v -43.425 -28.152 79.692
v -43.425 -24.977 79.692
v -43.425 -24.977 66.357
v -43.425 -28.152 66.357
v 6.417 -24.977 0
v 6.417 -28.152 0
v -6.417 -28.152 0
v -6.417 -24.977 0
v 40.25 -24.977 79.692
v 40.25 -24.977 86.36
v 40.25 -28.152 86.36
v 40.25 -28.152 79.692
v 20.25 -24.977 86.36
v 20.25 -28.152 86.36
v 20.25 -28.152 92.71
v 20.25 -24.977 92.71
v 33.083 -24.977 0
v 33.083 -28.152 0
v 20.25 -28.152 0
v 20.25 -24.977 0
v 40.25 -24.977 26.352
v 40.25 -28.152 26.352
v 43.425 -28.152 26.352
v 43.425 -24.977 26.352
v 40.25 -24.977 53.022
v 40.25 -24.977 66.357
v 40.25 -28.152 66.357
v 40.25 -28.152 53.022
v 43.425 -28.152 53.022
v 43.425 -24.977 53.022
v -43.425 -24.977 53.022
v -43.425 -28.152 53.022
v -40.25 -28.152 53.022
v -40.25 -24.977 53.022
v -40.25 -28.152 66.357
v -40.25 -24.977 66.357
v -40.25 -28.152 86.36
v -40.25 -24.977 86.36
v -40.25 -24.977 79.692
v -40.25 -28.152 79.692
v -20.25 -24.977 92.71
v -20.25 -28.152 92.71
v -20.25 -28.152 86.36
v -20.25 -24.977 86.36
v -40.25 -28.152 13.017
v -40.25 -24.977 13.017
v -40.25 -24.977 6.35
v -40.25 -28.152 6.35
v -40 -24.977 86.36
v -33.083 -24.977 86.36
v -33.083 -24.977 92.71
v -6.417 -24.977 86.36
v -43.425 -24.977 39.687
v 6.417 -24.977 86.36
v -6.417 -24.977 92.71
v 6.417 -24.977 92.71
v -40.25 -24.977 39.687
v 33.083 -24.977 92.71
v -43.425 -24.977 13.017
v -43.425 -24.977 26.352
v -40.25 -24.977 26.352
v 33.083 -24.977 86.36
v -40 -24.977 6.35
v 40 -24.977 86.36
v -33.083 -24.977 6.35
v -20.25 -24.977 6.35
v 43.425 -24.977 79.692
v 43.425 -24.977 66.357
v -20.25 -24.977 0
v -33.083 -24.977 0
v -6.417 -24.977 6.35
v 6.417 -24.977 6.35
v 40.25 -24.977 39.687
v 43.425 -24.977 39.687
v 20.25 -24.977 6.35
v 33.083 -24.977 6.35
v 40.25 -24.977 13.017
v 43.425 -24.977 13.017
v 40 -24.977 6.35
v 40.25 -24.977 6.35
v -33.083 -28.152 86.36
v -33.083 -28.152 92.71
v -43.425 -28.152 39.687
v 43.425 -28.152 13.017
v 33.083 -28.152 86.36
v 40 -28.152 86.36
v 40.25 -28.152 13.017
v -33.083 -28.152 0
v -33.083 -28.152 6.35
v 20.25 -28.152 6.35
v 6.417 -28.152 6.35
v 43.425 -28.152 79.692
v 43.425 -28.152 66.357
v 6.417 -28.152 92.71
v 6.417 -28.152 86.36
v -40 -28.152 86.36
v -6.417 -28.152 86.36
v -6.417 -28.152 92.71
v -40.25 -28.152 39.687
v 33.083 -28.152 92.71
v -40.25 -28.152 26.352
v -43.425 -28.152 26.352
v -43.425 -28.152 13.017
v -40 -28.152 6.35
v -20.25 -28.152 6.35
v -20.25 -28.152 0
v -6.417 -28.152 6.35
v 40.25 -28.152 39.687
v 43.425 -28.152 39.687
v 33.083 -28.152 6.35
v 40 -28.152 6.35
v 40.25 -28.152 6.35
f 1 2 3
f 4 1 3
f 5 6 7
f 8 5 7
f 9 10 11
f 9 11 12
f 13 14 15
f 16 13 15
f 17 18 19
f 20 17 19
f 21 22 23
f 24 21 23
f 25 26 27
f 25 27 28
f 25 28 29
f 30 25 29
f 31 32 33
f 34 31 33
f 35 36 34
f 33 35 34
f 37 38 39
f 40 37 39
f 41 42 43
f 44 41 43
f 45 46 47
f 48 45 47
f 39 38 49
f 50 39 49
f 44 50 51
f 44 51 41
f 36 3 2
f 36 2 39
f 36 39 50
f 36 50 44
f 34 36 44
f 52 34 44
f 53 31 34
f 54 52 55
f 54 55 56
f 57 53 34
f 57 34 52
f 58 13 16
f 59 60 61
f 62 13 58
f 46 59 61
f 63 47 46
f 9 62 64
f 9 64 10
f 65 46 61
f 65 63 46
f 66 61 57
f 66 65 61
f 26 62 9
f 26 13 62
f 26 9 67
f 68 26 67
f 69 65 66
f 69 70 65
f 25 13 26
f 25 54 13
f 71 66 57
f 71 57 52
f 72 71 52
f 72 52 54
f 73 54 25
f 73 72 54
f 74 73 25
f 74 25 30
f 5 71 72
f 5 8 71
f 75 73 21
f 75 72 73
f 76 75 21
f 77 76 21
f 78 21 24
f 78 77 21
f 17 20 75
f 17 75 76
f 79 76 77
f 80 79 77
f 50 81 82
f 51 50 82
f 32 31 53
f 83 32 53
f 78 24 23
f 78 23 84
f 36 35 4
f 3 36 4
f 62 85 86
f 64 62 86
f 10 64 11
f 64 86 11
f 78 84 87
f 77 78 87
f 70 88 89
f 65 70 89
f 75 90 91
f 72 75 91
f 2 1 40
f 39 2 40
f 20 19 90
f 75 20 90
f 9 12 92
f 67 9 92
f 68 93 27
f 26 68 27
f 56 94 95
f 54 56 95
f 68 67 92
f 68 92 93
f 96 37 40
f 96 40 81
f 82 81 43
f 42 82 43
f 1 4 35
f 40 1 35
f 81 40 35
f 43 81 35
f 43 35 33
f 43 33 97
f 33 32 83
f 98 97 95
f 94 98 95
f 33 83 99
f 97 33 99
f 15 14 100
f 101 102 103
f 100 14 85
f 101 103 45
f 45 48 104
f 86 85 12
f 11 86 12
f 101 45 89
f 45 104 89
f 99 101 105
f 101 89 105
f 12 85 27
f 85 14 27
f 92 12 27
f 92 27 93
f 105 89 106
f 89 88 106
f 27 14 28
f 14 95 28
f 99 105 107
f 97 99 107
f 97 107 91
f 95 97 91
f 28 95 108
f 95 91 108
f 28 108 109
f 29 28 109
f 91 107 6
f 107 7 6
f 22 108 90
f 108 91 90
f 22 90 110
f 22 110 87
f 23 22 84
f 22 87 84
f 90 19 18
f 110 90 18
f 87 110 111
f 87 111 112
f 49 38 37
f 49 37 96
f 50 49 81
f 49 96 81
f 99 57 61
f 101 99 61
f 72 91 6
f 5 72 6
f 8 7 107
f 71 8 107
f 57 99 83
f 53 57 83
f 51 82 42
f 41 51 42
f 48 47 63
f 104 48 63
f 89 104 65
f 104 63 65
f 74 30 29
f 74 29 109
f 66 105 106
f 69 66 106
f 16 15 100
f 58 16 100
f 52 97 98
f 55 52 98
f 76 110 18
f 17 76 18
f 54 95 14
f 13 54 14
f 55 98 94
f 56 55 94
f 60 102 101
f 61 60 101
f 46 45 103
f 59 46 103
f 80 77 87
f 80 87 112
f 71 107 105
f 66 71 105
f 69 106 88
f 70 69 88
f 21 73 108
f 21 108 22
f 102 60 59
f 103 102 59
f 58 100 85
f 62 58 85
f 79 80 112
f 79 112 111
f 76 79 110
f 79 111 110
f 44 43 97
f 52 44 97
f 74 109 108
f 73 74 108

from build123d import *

# Parameters (mm, degrees)
BOSS_EXTRUDE1_DEPTH      = 1.5875
BOSS_EXTRUDE1_DEPTH_BACK = 1.5875
SKETCH3_W                = 0.25
SKETCH3_H                = 13.334960838
SKETCH3_H_2              = 13.334960839
CUT_EXTRUDE1_DEPTH       = 103.531394128
SKETCH4_W                = 0.25
SKETCH4_H                = 6.667480419
SKETCH4_H_2              = 13.334960838
BOSS_EXTRUDE2_DEPTH      = 3.175


with BuildPart() as part:
    # Sketch2 → Boss-Extrude1 (new, two sides: drawn at the far end of the back side and taken through both)
    with BuildSketch(Plane(origin=(0, -26.564964534, 0), x_dir=(1, 0, 0), z_dir=(0, 1, 0)).offset(-BOSS_EXTRUDE1_DEPTH_BACK)):
        Polygon((-40, -26.352441257), (-40, -39.687402095), (-43.675, -39.687402095), (-43.675, -53.022362934), (-40, -53.022362934), (-40, -66.357323772), (-43.675, -66.357323772), (-43.675, -79.69228461), (-40, -79.69228461), (-40, -86.359765029), (-33.083333333, -86.359765029), (-33.083333333, -92.709765029), (-20.25, -92.709765029), (-20.25, -86.359765029), (-6.416666667, -86.359765029), (-6.416666667, -92.709765029), (6.416666667, -92.709765029), (6.416666667, -86.359765029), (20.25, -86.359765029), (20.25, -92.709765029), (33.083333333, -92.709765029), (33.083333333, -86.359765029), (40, -86.359765029), (40, -79.69228461), (43.675, -79.69228461), (43.675, -66.357323772), (40, -66.357323772), (40, -53.022362934), (43.675, -53.022362934), (43.675, -39.687402095), (40, -39.687402095), (40, -26.352441257), (43.675, -26.352441257), (43.675, -13.017480419), (40, -13.017480419), (40, -6.35), (33.083333333, -6.35), (33.083333333, 0), (20.25, 0), (20.25, -6.35), (6.416666667, -6.35), (6.416666667, 0), (-6.416666667, 0), (-6.416666667, -6.35), (-20.25, -6.35), (-20.25, 0), (-33.083333333, 0), (-33.083333333, -6.35), (-40, -6.35), (-40, -13.017480419), (-43.675, -13.017480419), (-43.675, -26.352441257), align=None)
    extrude(amount=BOSS_EXTRUDE1_DEPTH + BOSS_EXTRUDE1_DEPTH_BACK)

    # Sketch3 → Cut-Extrude1 (cut, through all)
    with BuildSketch(Plane(origin=(0, -24.977464534, 0), x_dir=(1, 0, 0), z_dir=(0, 1, 0))):
        with Locations((-43.55, -19.684960838)):
            Rectangle(SKETCH3_W, SKETCH3_H)
        with Locations((-43.55, -46.354882515)):
            Rectangle(SKETCH3_W, SKETCH3_H_2)
        with Locations((-43.55, -73.024804191)):
            Rectangle(SKETCH3_W, SKETCH3_H)
        with Locations((43.55, -19.684960838)):
            Rectangle(SKETCH3_W, SKETCH3_H)
        with Locations((43.55, -46.354882515)):
            Rectangle(SKETCH3_W, SKETCH3_H_2)
        with Locations((43.55, -73.024804191)):
            Rectangle(SKETCH3_W, SKETCH3_H)
    extrude(amount=-CUT_EXTRUDE1_DEPTH, mode=Mode.SUBTRACT)

    # Sketch4 → Boss-Extrude2 (add)
    with BuildSketch(Plane(origin=(0, -24.977464534, 0), x_dir=(1, 0, 0), z_dir=(0, 1, 0))):
        with Locations((-40.125, -9.683740209)):
            Rectangle(SKETCH4_W, SKETCH4_H)
        with Locations((-40.125, -33.019921676)):
            Rectangle(SKETCH4_W, SKETCH4_H_2)
        with Locations((-40.125, -59.689843353)):
            Rectangle(SKETCH4_W, SKETCH4_H_2)
        with Locations((-40.125, -83.02602482)):
            Rectangle(SKETCH4_W, SKETCH4_H)
        with Locations((40.125, -83.02602482)):
            Rectangle(SKETCH4_W, SKETCH4_H)
        with Locations((40.125, -59.689843353)):
            Rectangle(SKETCH4_W, SKETCH4_H_2)
        with Locations((40.125, -33.019921676)):
            Rectangle(SKETCH4_W, SKETCH4_H_2)
        with Locations((40.125, -9.683740209)):
            Rectangle(SKETCH4_W, SKETCH4_H)
    extrude(amount=-BOSS_EXTRUDE2_DEPTH)


solid = part.part
